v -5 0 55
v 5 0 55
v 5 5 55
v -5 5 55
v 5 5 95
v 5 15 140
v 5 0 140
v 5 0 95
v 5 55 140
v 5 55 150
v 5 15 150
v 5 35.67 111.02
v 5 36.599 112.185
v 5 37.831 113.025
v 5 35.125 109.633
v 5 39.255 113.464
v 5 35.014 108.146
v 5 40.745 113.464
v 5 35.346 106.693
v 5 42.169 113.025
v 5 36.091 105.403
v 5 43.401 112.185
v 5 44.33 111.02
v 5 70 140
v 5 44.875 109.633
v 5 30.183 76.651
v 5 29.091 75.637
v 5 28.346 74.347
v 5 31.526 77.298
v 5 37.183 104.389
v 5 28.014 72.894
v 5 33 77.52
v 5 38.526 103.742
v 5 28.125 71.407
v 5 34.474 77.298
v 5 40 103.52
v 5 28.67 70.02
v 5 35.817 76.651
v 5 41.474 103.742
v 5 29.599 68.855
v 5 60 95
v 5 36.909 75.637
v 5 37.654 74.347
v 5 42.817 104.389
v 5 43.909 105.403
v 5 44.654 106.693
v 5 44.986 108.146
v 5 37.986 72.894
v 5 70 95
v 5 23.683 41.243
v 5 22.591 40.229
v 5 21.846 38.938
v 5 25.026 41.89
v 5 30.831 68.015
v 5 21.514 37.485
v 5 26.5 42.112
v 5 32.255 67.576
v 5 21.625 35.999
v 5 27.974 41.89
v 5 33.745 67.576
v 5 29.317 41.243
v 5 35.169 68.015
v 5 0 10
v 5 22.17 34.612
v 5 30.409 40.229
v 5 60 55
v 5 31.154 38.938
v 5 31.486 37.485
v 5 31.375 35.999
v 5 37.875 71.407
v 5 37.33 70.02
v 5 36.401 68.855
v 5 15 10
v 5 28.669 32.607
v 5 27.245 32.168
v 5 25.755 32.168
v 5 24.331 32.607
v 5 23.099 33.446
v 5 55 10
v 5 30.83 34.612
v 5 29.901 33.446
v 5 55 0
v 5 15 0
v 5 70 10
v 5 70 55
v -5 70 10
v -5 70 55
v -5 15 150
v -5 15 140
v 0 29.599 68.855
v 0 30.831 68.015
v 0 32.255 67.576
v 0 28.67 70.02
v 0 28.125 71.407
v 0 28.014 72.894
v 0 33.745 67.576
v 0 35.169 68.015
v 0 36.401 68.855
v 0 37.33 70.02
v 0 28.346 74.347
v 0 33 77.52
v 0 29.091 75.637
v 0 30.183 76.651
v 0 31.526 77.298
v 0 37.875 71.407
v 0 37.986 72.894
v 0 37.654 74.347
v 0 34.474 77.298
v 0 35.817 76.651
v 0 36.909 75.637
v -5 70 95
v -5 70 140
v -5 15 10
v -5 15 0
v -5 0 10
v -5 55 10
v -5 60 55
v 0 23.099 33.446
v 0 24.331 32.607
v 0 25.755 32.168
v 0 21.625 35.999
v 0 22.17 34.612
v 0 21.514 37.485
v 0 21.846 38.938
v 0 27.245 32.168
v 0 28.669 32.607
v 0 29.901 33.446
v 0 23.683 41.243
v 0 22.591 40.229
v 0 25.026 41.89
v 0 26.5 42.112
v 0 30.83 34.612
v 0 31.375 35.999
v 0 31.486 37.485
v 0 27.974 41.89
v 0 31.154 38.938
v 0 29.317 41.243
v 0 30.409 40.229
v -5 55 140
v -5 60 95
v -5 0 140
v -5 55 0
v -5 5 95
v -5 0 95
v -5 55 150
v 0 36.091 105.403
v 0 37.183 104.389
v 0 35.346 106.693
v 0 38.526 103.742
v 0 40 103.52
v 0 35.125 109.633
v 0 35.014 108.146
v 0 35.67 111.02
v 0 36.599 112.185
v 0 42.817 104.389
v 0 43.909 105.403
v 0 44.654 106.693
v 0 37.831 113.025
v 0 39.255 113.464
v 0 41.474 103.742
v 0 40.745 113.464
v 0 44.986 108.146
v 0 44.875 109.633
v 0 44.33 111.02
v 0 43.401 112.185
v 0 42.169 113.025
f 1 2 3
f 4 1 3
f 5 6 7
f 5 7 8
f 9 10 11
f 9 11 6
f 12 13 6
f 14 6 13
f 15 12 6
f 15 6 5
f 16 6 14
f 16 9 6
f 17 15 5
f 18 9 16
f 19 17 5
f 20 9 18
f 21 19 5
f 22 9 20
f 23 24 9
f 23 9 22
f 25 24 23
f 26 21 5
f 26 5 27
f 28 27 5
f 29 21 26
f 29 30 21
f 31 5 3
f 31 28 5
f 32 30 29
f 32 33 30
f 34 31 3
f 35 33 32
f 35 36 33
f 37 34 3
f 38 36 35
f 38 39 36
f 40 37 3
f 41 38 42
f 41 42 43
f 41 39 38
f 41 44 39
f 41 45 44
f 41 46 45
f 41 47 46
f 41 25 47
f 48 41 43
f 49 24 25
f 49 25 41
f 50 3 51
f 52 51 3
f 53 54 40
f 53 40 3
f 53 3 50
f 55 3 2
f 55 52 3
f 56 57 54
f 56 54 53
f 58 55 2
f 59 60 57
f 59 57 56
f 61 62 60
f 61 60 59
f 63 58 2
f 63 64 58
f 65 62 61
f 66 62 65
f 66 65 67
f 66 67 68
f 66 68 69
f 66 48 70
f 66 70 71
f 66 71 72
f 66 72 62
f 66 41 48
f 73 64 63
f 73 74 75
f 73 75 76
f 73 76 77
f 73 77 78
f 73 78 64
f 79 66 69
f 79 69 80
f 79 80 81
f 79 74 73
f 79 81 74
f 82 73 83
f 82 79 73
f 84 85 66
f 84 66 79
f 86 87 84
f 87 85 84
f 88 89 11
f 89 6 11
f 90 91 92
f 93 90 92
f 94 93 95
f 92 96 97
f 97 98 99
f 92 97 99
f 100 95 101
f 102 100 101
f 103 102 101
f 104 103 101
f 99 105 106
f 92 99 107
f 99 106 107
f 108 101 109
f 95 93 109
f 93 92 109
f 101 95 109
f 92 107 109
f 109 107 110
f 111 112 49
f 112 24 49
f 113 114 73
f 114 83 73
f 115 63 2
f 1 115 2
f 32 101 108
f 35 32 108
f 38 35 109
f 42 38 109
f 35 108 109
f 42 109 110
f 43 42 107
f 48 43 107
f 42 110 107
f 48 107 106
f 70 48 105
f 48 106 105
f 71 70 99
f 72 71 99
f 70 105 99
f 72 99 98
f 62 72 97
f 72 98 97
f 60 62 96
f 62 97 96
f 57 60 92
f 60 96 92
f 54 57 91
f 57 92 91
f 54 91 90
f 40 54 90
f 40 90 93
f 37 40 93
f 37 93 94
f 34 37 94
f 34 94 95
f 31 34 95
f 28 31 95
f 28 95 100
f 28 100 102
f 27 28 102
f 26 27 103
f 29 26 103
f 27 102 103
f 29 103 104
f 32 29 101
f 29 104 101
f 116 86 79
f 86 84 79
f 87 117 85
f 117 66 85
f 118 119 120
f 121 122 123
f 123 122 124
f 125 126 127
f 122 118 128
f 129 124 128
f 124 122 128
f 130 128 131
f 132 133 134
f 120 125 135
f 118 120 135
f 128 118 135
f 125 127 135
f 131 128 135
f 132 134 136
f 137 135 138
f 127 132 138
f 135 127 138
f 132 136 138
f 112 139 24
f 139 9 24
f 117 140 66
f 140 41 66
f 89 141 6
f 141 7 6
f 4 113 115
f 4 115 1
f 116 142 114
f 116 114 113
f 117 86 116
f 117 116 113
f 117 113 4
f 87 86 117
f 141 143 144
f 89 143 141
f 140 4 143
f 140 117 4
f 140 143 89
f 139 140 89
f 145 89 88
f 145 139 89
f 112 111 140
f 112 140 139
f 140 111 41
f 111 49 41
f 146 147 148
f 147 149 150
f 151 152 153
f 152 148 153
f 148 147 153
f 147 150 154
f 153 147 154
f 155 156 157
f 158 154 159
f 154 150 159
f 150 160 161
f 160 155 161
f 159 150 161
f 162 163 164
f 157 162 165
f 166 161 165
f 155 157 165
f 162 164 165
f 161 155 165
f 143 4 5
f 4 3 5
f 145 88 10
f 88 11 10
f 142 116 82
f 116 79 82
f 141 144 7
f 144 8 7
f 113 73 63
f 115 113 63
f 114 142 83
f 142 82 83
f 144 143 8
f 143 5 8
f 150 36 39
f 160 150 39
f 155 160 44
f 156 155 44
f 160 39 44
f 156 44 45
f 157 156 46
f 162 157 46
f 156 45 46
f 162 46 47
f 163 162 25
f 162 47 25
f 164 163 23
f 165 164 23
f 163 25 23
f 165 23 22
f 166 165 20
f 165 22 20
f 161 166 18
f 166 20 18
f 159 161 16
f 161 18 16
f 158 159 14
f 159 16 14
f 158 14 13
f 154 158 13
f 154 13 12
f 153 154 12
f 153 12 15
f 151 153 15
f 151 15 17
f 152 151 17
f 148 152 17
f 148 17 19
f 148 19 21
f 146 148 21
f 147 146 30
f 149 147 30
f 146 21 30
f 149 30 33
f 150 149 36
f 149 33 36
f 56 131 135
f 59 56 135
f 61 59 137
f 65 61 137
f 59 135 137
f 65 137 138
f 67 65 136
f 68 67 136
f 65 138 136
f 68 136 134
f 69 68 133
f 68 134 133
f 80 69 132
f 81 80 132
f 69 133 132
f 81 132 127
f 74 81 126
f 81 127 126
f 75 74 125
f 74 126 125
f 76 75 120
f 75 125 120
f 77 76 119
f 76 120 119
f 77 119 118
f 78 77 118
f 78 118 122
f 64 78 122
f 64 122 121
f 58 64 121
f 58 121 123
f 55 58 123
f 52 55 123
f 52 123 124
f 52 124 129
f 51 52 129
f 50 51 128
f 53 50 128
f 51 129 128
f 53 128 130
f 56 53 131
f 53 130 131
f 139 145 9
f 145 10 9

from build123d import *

# Parameters (mm, degrees)
BOSS_EXTRUDE1_DEPTH = 5
SKETCH5_R           = 5
CUT_EXTRUDE4_DEPTH  = 5
SKETCH2_R           = 5
CUT_EXTRUDE5_DEPTH  = 5
BOSS_EXTRUDE2_DEPTH = 5


with BuildPart() as part:
    # Sketch1 → Boss-Extrude1 (new body)
    with BuildSketch(Plane(origin=(0, 0, 0), x_dir=(0, 0, -1), z_dir=(1, 0, 0))):
        Polygon((-95, 70), (-140, 70), (-140, 55), (-150, 55), (-150, 15), (-140, 15), (-140, 0), (-95, 0), (-95, 5), (-55, 5), (-55, 0), (-10, 0), (-10, 15), (0, 15), (0, 55), (-10, 55), (-10, 70), (-55, 70), (-55, 60), (-95, 60), align=None)
    extrude(amount=BOSS_EXTRUDE1_DEPTH)

    # Sketch5 → Cut-Extrude4 (cut)
    with BuildSketch(Plane.ZY):
        with Locations((37.111667647, 26.5)):
            Circle(SKETCH5_R)
        with Locations((72.52, 33)):
            Circle(SKETCH5_R)
    extrude(amount=-CUT_EXTRUDE4_DEPTH, mode=Mode.SUBTRACT)

    # Sketch2 → Cut-Extrude5 (cut)
    with BuildSketch(Plane(origin=(5, 0, 0), x_dir=(0, 0, -1), z_dir=(1, 0, 0))):
        with Locations((-108.52, 40)):
            Circle(SKETCH2_R)
    extrude(amount=-CUT_EXTRUDE5_DEPTH, mode=Mode.SUBTRACT)

    # Sketch6 → Boss-Extrude2 (add)
    with BuildSketch(Plane.ZY):
        Polygon((55, 0), (55, 5), (95, 5), (95, 0), (140, 0), (140, 15), (150, 15), (150, 55), (140, 55), (140, 70), (95, 70), (95, 60), (55, 60), (55, 70), (10, 70), (10, 55), (0, 55), (0, 15), (10, 15), (10, 0), align=None)
    extrude(amount=BOSS_EXTRUDE2_DEPTH)


solid = part.part
